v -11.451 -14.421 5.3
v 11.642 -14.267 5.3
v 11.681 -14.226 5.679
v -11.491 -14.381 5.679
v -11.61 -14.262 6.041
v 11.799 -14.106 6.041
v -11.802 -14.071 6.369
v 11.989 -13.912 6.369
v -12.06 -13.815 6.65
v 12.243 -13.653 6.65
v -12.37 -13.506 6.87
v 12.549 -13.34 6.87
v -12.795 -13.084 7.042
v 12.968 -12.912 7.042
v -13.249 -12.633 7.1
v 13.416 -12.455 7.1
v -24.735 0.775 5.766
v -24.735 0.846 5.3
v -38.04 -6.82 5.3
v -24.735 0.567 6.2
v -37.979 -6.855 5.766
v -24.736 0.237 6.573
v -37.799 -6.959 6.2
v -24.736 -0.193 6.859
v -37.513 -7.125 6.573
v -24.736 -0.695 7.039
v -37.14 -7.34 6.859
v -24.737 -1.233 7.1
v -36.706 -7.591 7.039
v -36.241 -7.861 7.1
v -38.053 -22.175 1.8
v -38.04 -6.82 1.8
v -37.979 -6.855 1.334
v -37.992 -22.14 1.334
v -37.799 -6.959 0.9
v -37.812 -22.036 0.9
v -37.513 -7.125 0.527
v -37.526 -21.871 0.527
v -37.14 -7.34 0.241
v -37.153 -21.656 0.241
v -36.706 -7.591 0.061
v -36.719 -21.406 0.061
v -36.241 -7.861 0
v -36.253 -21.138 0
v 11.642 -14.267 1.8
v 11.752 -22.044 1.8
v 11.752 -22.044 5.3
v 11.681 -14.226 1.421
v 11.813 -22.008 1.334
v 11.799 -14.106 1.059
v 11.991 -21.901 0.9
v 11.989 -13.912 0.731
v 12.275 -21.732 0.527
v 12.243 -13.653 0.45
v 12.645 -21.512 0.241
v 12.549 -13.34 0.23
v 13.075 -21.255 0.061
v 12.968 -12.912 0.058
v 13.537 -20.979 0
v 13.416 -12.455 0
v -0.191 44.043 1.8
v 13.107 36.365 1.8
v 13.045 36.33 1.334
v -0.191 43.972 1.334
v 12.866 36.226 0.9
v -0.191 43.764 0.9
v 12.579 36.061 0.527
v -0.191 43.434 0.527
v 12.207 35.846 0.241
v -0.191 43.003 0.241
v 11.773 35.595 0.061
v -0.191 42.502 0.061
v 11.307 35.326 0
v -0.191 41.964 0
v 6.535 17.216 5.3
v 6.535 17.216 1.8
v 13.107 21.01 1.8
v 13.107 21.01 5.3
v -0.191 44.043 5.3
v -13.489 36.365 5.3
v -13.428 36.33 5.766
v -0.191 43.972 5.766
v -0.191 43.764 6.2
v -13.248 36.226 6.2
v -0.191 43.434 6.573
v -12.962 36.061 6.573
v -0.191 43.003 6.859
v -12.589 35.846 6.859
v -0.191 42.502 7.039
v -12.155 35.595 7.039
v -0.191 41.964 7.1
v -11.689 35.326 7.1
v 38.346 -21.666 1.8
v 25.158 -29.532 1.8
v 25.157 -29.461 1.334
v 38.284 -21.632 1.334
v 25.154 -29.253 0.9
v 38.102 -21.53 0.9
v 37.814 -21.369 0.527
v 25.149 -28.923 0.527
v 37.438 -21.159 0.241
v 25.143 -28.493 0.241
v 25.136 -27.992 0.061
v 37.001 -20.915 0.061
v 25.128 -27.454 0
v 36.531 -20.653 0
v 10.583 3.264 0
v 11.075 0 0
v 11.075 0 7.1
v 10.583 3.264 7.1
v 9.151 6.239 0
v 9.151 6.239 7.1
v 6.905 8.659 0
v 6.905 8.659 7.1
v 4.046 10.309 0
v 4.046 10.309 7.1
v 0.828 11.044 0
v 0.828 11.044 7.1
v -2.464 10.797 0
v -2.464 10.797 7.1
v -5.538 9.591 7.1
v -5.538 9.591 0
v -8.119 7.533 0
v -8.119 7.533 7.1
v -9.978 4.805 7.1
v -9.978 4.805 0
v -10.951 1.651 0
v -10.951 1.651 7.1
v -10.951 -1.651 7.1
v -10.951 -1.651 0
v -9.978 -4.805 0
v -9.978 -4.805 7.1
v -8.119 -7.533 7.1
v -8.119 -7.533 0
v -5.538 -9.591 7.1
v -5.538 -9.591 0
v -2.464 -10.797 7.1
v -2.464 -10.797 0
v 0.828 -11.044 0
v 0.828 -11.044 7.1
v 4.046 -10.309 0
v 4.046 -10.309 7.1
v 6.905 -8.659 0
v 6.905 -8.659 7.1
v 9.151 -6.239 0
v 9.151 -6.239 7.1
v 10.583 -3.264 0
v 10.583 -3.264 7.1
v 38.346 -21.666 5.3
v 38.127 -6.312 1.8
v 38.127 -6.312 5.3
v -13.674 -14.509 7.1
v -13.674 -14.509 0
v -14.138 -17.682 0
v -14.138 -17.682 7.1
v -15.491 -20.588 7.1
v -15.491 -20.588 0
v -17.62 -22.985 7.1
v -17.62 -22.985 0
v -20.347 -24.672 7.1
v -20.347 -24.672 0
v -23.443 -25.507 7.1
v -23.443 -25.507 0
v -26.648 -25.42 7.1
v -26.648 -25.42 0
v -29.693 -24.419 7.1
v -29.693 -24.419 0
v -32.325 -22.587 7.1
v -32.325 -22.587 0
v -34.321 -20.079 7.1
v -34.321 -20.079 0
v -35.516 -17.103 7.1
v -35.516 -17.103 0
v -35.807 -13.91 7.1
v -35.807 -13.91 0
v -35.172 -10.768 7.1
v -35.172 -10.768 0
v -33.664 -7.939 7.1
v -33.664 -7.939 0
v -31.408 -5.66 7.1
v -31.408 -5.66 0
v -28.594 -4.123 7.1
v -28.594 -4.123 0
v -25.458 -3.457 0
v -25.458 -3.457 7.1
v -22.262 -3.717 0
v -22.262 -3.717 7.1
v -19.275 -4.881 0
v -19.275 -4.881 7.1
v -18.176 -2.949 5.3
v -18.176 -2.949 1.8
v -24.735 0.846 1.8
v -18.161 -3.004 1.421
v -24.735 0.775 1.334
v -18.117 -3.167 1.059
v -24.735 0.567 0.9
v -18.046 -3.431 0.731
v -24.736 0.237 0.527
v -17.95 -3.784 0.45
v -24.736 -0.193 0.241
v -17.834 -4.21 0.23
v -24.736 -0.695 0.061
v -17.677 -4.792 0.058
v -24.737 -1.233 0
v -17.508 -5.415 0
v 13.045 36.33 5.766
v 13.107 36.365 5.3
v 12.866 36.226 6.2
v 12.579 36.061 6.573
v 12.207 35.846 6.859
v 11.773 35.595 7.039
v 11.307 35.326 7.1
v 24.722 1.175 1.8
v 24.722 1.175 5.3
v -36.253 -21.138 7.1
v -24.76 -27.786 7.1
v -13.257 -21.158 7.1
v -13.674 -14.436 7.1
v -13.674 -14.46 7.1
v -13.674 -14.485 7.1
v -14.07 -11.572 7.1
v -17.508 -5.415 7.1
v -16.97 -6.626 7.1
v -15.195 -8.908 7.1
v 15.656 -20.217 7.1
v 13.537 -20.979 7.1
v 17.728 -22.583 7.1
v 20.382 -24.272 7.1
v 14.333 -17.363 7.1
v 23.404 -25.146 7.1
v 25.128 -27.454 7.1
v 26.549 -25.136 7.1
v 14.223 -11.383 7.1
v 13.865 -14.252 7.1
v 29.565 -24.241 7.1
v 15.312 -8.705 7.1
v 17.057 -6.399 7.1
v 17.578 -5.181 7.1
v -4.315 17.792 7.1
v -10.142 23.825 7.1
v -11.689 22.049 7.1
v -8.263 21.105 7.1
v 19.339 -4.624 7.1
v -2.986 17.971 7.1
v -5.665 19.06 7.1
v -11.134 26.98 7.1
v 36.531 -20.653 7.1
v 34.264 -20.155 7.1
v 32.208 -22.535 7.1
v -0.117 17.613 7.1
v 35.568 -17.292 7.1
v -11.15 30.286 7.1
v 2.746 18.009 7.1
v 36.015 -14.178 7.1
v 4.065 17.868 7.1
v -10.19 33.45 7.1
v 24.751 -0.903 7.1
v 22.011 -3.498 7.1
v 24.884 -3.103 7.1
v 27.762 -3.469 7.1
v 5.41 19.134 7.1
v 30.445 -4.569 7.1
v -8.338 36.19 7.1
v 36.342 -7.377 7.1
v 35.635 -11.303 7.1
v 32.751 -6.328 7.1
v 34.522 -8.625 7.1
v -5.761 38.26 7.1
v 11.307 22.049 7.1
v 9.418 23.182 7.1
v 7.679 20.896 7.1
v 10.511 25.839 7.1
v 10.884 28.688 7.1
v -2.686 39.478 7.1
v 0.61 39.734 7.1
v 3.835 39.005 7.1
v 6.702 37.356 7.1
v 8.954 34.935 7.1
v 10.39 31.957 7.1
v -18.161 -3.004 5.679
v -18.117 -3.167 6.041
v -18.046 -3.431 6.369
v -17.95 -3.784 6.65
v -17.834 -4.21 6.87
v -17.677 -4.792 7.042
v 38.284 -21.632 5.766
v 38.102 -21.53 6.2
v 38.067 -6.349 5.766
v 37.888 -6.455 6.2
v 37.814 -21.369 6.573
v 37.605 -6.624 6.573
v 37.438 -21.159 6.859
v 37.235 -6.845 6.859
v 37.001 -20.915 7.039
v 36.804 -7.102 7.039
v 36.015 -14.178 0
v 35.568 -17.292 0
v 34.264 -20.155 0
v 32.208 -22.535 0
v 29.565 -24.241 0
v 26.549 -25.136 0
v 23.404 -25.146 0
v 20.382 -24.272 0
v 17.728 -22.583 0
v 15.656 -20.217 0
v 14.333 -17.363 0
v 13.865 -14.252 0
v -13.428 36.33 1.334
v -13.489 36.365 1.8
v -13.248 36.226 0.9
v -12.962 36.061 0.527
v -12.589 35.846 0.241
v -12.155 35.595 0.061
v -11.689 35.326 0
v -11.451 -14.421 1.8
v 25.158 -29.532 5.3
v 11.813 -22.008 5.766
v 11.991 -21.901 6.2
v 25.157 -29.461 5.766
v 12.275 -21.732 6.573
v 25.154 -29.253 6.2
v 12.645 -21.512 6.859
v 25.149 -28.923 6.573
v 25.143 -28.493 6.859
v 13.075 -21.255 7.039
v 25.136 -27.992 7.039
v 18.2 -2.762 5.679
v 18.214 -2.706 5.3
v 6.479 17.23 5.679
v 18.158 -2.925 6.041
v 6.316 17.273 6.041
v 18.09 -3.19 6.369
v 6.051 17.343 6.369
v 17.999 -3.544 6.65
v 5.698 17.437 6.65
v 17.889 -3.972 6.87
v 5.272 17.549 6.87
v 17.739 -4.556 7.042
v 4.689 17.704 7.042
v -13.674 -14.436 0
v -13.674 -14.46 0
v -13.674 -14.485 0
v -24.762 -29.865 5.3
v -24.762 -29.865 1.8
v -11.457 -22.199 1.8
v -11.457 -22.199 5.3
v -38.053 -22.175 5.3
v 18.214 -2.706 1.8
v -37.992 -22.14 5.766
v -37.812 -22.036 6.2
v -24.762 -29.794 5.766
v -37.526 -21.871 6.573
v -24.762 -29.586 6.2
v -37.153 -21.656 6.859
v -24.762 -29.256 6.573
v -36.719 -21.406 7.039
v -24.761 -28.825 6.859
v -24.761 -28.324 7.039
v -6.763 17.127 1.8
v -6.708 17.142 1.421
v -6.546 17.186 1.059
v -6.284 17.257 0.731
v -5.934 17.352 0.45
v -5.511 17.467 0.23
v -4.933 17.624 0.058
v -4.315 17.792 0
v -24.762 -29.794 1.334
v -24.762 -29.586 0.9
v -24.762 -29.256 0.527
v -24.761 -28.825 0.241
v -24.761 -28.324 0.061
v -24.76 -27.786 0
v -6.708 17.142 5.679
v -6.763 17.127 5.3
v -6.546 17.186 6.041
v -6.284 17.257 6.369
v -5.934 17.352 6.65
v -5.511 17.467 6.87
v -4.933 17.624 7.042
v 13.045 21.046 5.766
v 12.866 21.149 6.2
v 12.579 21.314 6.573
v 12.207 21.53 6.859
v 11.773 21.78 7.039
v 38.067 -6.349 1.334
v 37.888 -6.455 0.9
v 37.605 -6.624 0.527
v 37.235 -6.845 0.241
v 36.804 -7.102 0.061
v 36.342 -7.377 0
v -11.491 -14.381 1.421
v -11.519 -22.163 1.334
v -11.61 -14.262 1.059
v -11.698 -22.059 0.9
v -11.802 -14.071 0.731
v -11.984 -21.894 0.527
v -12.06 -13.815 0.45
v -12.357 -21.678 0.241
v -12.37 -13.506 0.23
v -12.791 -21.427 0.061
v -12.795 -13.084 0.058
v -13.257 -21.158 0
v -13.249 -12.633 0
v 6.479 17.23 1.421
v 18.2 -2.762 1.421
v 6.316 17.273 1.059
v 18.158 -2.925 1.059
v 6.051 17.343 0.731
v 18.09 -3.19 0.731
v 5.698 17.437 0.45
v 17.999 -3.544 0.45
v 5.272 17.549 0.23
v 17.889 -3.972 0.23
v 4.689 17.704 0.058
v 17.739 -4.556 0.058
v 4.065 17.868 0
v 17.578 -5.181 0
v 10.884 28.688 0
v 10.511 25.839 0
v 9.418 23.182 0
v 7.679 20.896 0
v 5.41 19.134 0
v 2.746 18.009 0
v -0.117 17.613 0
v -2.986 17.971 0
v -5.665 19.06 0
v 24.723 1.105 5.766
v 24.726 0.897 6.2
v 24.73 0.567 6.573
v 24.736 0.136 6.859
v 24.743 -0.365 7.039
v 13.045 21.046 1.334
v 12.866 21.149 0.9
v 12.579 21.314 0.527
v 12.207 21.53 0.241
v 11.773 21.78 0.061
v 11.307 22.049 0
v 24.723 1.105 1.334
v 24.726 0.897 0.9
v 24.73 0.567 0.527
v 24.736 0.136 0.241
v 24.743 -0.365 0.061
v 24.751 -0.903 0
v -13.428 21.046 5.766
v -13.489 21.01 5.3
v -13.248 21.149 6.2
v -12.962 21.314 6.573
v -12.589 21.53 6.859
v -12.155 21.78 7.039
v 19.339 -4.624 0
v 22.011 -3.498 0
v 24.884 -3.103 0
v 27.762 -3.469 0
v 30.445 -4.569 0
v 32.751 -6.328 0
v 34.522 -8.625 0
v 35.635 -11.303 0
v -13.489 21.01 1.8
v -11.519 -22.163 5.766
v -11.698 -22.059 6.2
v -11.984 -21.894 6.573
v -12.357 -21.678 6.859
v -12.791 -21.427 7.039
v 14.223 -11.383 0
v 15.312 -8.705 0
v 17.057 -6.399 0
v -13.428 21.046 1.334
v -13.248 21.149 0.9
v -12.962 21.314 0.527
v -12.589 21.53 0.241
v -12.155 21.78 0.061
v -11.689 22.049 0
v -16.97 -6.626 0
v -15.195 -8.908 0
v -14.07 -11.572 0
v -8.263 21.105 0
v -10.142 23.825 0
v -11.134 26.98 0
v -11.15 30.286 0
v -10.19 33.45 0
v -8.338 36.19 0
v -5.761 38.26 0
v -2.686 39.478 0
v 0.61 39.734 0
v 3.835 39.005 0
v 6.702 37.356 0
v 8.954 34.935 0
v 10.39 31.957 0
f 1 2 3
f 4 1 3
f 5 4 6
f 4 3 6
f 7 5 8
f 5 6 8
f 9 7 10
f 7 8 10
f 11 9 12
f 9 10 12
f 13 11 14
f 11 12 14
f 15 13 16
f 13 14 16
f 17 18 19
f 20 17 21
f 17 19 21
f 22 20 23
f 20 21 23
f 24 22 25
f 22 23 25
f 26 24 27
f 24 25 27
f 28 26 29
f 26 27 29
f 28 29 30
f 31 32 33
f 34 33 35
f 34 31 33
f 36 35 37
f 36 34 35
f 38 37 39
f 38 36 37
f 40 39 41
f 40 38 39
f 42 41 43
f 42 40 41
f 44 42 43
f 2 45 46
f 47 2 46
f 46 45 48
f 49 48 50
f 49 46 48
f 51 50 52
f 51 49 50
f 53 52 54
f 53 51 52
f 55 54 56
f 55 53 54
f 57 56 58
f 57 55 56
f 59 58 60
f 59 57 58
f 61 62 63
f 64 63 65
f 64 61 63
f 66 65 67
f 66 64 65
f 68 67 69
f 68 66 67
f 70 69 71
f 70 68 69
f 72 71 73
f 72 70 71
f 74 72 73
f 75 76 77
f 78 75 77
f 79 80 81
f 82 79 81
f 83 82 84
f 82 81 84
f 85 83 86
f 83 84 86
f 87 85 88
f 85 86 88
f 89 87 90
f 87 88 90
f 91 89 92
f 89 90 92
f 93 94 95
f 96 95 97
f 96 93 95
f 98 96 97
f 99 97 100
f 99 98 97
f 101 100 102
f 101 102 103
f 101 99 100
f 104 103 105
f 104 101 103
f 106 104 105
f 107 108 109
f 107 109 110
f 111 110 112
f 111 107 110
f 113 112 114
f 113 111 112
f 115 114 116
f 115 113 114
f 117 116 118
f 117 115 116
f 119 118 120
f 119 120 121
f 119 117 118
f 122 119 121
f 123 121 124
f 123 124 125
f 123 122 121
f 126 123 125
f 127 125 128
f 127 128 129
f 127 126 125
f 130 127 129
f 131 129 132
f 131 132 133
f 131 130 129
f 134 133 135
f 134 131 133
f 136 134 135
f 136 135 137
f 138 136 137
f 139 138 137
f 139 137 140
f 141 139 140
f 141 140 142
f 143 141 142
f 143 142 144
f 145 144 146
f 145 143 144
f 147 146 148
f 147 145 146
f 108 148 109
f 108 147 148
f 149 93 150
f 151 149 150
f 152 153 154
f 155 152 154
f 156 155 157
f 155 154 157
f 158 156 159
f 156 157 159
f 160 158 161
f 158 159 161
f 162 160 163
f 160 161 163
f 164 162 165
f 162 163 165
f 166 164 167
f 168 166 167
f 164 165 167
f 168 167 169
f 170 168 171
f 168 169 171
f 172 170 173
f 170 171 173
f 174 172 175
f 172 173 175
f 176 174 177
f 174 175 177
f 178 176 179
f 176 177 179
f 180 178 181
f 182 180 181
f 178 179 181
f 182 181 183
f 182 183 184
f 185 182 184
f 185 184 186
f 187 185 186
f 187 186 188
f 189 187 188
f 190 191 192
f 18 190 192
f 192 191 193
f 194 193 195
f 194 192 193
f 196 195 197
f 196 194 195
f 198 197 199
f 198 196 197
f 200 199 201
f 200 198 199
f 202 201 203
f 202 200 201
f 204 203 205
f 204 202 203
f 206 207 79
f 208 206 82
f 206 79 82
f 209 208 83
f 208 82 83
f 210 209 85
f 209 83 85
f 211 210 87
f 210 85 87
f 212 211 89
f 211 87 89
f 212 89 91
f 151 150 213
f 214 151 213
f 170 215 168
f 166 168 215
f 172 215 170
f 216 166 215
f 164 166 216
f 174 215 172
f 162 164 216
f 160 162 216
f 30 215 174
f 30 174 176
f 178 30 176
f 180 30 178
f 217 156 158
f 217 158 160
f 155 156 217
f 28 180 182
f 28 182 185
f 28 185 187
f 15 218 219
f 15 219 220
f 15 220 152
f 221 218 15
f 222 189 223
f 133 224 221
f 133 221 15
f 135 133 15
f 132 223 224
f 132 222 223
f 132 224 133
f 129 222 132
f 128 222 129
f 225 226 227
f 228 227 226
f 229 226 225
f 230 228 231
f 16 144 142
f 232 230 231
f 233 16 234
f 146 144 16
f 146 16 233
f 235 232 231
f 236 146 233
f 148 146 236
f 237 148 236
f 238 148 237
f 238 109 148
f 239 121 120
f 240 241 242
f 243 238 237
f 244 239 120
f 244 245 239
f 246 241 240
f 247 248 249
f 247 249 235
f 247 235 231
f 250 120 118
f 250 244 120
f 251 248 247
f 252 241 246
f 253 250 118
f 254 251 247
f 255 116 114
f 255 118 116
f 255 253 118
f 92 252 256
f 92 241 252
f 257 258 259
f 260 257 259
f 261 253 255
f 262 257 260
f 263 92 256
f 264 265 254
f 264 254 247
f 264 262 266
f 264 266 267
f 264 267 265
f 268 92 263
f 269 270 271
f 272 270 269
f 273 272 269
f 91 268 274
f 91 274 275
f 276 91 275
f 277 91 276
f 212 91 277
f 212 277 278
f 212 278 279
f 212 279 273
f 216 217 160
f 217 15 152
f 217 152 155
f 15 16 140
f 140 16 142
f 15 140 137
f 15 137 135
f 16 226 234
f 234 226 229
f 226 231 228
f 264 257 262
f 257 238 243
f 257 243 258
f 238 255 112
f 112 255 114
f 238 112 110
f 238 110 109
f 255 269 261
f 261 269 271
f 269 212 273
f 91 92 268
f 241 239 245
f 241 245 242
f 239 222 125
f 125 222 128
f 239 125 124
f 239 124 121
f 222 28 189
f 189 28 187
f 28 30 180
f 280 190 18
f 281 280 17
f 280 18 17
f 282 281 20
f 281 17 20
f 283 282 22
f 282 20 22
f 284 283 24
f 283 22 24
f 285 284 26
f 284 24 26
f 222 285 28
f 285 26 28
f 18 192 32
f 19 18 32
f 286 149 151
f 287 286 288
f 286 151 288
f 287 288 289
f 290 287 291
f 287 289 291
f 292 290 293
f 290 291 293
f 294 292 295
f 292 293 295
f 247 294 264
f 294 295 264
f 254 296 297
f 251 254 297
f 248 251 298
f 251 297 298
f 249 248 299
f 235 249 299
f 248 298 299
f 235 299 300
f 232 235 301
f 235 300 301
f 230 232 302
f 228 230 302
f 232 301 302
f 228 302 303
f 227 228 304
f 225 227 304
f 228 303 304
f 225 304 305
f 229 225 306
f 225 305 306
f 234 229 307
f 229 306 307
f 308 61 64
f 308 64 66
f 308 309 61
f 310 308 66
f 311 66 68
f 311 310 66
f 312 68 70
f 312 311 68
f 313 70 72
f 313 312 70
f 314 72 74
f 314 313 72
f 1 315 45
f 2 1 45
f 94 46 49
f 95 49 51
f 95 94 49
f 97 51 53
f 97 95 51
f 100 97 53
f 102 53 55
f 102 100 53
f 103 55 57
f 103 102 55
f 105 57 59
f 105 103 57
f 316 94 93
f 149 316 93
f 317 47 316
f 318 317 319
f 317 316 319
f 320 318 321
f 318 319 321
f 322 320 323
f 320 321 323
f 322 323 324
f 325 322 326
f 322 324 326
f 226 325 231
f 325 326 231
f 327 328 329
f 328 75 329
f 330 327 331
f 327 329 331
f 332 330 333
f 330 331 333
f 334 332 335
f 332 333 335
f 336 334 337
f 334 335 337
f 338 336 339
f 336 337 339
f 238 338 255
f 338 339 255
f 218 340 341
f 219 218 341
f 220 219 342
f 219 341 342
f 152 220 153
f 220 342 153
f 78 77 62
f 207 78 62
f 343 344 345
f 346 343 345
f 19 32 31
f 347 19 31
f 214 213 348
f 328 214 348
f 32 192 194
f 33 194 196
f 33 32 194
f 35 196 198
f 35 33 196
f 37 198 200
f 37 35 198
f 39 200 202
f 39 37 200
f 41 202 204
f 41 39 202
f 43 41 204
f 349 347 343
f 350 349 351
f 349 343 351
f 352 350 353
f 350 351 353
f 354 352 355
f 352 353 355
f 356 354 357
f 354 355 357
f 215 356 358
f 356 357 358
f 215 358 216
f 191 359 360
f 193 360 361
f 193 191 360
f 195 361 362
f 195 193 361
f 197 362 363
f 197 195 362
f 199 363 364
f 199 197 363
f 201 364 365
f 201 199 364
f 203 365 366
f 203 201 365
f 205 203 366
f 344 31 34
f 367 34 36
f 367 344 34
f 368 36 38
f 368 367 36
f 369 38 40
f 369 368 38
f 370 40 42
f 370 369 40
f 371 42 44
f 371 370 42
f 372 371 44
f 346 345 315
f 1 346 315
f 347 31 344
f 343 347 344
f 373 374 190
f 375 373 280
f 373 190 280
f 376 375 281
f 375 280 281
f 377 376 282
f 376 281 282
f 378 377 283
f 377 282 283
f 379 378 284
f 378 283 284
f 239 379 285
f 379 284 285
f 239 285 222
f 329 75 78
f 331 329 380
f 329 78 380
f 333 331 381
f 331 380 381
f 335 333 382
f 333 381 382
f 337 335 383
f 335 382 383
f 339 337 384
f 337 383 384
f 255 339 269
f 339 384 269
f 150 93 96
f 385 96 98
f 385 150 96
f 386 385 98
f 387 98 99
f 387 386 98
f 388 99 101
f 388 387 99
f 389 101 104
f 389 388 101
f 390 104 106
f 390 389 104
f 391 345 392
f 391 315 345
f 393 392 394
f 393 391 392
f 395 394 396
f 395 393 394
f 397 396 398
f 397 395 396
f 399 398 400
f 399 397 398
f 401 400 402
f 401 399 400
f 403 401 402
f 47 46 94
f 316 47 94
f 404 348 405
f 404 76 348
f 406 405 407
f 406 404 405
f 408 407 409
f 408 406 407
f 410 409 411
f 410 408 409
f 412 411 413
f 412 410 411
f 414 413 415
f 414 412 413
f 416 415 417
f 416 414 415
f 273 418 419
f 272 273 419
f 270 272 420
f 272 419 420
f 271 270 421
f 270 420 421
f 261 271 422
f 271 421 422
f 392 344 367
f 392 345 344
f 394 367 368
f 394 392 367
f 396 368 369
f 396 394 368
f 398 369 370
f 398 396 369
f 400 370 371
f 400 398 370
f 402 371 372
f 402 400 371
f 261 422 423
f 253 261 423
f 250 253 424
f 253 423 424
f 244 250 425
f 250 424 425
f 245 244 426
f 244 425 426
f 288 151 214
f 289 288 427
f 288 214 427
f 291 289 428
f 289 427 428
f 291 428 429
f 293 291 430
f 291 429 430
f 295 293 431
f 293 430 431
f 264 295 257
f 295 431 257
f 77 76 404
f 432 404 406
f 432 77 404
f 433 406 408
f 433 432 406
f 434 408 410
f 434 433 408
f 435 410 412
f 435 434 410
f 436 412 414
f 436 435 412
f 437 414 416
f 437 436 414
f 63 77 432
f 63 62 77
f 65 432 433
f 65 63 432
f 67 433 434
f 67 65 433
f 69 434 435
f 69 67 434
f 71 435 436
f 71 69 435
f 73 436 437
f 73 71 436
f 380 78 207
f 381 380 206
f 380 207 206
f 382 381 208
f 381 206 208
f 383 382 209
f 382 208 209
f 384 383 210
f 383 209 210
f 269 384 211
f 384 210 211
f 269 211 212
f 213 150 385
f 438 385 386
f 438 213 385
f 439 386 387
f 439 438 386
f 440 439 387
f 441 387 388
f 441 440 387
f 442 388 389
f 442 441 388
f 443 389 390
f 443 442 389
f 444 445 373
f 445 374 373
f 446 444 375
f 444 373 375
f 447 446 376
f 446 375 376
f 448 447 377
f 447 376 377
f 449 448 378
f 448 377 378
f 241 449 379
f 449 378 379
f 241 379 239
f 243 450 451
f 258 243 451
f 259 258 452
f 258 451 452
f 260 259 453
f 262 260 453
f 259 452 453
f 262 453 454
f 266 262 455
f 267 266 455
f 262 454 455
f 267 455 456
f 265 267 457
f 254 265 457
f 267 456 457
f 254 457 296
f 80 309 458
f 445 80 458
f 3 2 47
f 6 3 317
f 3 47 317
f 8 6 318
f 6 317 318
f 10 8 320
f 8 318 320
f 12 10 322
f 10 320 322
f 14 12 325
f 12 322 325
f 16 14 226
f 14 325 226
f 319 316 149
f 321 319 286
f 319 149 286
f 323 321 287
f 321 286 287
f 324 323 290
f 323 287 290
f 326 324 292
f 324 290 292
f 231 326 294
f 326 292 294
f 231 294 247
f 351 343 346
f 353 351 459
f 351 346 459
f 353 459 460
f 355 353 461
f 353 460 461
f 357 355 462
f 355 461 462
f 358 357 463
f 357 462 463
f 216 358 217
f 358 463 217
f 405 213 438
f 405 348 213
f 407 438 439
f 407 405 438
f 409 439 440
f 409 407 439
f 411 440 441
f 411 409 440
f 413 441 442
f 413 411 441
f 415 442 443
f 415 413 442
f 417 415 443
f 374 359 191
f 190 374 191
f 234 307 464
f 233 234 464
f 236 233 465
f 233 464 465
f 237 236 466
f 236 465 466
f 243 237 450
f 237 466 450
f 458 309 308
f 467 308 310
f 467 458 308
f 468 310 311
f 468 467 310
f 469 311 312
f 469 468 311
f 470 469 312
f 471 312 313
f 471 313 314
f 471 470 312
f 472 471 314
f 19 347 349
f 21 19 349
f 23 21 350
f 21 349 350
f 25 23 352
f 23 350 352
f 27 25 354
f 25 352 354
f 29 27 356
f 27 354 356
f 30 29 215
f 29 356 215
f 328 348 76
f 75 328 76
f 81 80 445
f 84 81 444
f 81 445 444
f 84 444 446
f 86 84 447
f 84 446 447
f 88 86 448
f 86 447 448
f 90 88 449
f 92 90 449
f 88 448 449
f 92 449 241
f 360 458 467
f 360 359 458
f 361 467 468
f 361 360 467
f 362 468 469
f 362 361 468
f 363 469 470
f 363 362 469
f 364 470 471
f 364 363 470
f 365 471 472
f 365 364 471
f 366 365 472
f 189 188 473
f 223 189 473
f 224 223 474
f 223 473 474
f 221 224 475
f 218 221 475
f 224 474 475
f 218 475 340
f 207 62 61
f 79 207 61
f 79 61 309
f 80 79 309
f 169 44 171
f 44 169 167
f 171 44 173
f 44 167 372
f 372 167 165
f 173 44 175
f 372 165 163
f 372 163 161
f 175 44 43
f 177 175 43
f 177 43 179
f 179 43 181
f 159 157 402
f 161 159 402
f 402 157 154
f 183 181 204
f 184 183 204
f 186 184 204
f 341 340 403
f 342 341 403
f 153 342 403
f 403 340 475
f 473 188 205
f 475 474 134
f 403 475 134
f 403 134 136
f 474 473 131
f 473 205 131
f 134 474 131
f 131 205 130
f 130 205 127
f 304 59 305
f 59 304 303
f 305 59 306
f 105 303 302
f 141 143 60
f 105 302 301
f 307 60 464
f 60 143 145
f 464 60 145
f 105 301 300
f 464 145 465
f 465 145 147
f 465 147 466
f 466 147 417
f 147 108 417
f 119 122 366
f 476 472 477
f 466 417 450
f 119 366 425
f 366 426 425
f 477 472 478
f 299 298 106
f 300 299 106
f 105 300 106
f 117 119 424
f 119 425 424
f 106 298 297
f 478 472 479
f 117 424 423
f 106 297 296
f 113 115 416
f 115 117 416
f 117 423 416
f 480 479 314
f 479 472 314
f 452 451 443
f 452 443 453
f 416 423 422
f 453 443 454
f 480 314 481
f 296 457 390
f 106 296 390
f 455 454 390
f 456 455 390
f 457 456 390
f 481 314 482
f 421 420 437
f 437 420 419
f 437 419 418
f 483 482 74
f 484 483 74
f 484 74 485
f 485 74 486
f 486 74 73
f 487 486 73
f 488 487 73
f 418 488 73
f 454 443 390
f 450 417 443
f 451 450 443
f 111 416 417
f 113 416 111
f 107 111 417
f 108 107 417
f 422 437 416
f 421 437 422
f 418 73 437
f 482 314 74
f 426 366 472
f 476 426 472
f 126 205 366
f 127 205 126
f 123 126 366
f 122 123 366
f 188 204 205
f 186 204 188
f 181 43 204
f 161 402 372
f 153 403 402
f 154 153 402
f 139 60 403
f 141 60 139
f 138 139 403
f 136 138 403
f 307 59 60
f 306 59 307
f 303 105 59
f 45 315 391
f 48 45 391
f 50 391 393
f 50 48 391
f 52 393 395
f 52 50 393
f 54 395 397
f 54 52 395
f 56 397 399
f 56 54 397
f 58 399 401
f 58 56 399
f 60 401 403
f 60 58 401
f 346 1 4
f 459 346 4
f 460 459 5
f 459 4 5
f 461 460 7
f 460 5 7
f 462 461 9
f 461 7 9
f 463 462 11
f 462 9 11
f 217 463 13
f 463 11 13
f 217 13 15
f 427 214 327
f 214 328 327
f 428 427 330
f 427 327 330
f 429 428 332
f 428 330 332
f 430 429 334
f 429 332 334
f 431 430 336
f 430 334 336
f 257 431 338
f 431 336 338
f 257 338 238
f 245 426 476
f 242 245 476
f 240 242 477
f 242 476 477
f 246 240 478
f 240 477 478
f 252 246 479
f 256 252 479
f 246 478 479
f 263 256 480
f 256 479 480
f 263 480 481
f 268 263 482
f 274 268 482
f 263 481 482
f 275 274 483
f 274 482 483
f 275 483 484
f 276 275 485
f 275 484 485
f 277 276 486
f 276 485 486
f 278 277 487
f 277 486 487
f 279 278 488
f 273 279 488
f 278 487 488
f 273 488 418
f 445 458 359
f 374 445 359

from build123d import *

# Parameters (mm, degrees)
F0_R     = 11.075
F1_DEPTH = 7.1
F2_R     = 1.8


with BuildPart() as f1:
    # F0 (on Top) → F1 (new body)
    with BuildSketch(Plane.XY):
        with BuildLine():
            ThreePointArc((10.883850477, 28.6876300688), (9.4184768424, 23.182114097), (5.4101337969, 19.1335079129))
            Line((5.4101337969, 19.1335079129), (6.5345129791, 17.2156516926))
            Line((6.5345129791, 17.2156516926), (13.1067064335, 21.0101093527))
            Line((13.1067064335, 21.0101093527), (13.1067064335, 36.365150785))
            Line((13.1067064335, 36.365150785), (-0.191149523, 44.0426715011))
            Line((-0.191149523, 44.0426715011), (-13.4890054796, 36.365150785))
            Line((-13.4890054796, 36.365150785), (-13.4890054796, 21.0101093527))
            Line((-13.4890054796, 21.0101093527), (-6.7633429774, 17.1270462966))
            Line((-6.7633429774, 17.1270462966), (-5.664620361, 19.059715342))
            ThreePointArc((-5.664620361, 19.059715342), (-5.7605720905, 38.2603599441), (10.883850477, 28.6876300688))
        make_face()
        with BuildLine():
            Line((6.5345129791, 17.2156516926), (5.4101337969, 19.1335079129))
            ThreePointArc((5.4101337969, 19.1335079129), (-0.1173569522, 17.612875911), (-5.664620361, 19.059715342))
            Line((-5.664620361, 19.059715342), (-6.7633429774, 17.1270462966))
            Line((-6.7633429774, 17.1270462966), (-0.191149523, 13.3325886365))
            Line((-0.191149523, 13.3325886365), (6.5345129791, 17.2156516926))
        make_face()
        Polygon((18.2140135788, -2.7060999984), (6.5345129791, 17.2156516926), (-0.191149523, 13.3325886365), (-6.7633429774, 17.1270462966), (-18.1763357298, -2.9485737718), (-11.4438602402, -6.8435092462), (-11.4505581332, -14.420748465), (11.6417076562, -14.2668816039), (11.5340385205, -6.6904044278), align=None)
        Circle(F0_R, mode=Mode.SUBTRACT)
        with BuildLine():
            Line((24.7216007166, 1.1753827964), (18.2140135788, -2.7060999984))
            Line((18.2140135788, -2.7060999984), (19.3385078556, -4.6241525356))
            ThreePointArc((19.3385078556, -4.6241525356), (30.4453071473, -4.5686483261), (36.0147911755, -14.1782746915))
            ThreePointArc((36.0147911755, -14.1782746915), (24.9766876657, -25.2532132308), (13.8650370177, -14.2520672624))
            Line((13.8650370177, -14.2520672624), (11.6417076562, -14.2668816039))
            Line((11.6417076562, -14.2668816039), (11.7522289794, -22.0440619158))
            Line((11.7522289794, -22.0440619158), (25.1579816344, -29.5319321795))
            Line((25.1579816344, -29.5319321795), (38.3455438305, -21.6661449552))
            Line((38.3455438305, -21.6661449552), (38.1273533716, -6.3124874673))
            Line((38.1273533716, -6.3124874673), (24.7216007166, 1.1753827964))
        make_face()
        with BuildLine():
            Line((19.3385078556, -4.6241525356), (18.2140135788, -2.7060999984))
            Line((18.2140135788, -2.7060999984), (11.5340385205, -6.6904044278))
            Line((11.5340385205, -6.6904044278), (11.6417076562, -14.2668816039))
            Line((11.6417076562, -14.2668816039), (13.8650370177, -14.2520672624))
            ThreePointArc((13.8650370177, -14.2520672624), (15.3118764487, -8.7048038536), (19.3385078556, -4.6241525356))
        make_face()
        with BuildLine():
            Line((-11.4438602402, -6.8435092462), (-18.1763357298, -2.9485737718))
            Line((-18.1763357298, -2.9485737718), (-19.2751708145, -4.8814406505))
            ThreePointArc((-19.2751708145, -4.8814406505), (-15.1945194965, -8.9080720574), (-13.6738874946, -14.4355628064))
            Line((-13.6738874946, -14.4355628064), (-11.4505581332, -14.420748465))
            Line((-11.4505581332, -14.420748465), (-11.4438602402, -6.8435092462))
        make_face()
        with BuildLine():
            Line((-19.2751708145, -4.8814406505), (-18.1763357298, -2.9485737718))
            Line((-18.1763357298, -2.9485737718), (-24.7350684373, 0.8458463831))
            Line((-24.7350684373, 0.8458463831), (-38.0398498496, -6.819999748))
            Line((-38.0398498496, -6.819999748), (-38.0534230647, -22.1752015083))
            Line((-38.0534230647, -22.1752015083), (-24.7622148676, -29.8645571376))
            Line((-24.7622148676, -29.8645571376), (-11.4574334553, -22.1987110066))
            Line((-11.4574334553, -22.1987110066), (-11.4505581332, -14.420748465))
            Line((-11.4505581332, -14.420748465), (-13.6738874946, -14.4355628064))
            ThreePointArc((-13.6738874946, -14.4355628064), (-13.6737031132, -14.4724588871), (-13.6736416525, -14.5093553773))
            ThreePointArc((-13.6736416525, -14.5093553773), (-34.3213715277, -20.0787779447), (-19.2751708145, -4.8814406505))
        make_face()
    extrude(amount=F1_DEPTH)

    # F2
    f2_edges = [f1.edges().sort_by_distance(p)[0] for p in [
        (-18.109824, -26.031634, 7.1),
        (0.095575, -14.343815, 7.1),
        (18.455105, -25.787997, 7.1),
        (31.751763, -25.599039, 7.1),
        (38.236449, -13.989316, 7.1),
        (31.424477, -2.568552, 7.1),
        (21.467807, -0.765359, 7.1),
        (12.374263, 7.254776, 7.1),
        (-31.407819, -26.019879, 7.1),
        (-38.046636, -14.497601, 7.1),
        (-31.387459, -2.987077, 7.1),
        (-21.455702, -1.051364, 7.1),
        (-12.469839, 7.089236, 7.1),
        (-10.126174, 19.068578, 7.1),
        (-13.489005, 28.68763, 7.1),
        (-6.840078, 40.203911, 7.1),
        (6.457778, 40.203911, 7.1),
        (13.106706, 28.68763, 7.1),
        (9.82061, 19.112881, 7.1),
        (31.424477, -2.568552, 0),
        (21.467807, -0.765359, 0),
        (12.374263, 7.254776, 0),
        (9.82061, 19.112881, 0),
        (13.106706, 28.68763, 0),
        (6.457778, 40.203911, 0),
        (-6.840078, 40.203911, 0),
        (-13.489005, 28.68763, 0),
        (-10.126174, 19.068578, 0),
        (-12.469839, 7.089236, 0),
        (-21.455702, -1.051364, 0),
        (-31.387459, -2.987077, 0),
        (-38.046636, -14.497601, 0),
        (-31.407819, -26.019879, 0),
        (-18.109824, -26.031634, 0),
        (-11.453996, -18.30973, 0),
        (0.095575, -14.343815, 0),
        (11.696968, -18.155472, 0),
        (18.455105, -25.787997, 0),
        (31.751763, -25.599039, 0),
        (38.236449, -13.989316, 0),
        (-11.453996, -18.30973, 7.1),
        (11.696968, -18.155472, 7.1),
    ]]
    fillet(f2_edges, radius=F2_R)


solid = f1.part
